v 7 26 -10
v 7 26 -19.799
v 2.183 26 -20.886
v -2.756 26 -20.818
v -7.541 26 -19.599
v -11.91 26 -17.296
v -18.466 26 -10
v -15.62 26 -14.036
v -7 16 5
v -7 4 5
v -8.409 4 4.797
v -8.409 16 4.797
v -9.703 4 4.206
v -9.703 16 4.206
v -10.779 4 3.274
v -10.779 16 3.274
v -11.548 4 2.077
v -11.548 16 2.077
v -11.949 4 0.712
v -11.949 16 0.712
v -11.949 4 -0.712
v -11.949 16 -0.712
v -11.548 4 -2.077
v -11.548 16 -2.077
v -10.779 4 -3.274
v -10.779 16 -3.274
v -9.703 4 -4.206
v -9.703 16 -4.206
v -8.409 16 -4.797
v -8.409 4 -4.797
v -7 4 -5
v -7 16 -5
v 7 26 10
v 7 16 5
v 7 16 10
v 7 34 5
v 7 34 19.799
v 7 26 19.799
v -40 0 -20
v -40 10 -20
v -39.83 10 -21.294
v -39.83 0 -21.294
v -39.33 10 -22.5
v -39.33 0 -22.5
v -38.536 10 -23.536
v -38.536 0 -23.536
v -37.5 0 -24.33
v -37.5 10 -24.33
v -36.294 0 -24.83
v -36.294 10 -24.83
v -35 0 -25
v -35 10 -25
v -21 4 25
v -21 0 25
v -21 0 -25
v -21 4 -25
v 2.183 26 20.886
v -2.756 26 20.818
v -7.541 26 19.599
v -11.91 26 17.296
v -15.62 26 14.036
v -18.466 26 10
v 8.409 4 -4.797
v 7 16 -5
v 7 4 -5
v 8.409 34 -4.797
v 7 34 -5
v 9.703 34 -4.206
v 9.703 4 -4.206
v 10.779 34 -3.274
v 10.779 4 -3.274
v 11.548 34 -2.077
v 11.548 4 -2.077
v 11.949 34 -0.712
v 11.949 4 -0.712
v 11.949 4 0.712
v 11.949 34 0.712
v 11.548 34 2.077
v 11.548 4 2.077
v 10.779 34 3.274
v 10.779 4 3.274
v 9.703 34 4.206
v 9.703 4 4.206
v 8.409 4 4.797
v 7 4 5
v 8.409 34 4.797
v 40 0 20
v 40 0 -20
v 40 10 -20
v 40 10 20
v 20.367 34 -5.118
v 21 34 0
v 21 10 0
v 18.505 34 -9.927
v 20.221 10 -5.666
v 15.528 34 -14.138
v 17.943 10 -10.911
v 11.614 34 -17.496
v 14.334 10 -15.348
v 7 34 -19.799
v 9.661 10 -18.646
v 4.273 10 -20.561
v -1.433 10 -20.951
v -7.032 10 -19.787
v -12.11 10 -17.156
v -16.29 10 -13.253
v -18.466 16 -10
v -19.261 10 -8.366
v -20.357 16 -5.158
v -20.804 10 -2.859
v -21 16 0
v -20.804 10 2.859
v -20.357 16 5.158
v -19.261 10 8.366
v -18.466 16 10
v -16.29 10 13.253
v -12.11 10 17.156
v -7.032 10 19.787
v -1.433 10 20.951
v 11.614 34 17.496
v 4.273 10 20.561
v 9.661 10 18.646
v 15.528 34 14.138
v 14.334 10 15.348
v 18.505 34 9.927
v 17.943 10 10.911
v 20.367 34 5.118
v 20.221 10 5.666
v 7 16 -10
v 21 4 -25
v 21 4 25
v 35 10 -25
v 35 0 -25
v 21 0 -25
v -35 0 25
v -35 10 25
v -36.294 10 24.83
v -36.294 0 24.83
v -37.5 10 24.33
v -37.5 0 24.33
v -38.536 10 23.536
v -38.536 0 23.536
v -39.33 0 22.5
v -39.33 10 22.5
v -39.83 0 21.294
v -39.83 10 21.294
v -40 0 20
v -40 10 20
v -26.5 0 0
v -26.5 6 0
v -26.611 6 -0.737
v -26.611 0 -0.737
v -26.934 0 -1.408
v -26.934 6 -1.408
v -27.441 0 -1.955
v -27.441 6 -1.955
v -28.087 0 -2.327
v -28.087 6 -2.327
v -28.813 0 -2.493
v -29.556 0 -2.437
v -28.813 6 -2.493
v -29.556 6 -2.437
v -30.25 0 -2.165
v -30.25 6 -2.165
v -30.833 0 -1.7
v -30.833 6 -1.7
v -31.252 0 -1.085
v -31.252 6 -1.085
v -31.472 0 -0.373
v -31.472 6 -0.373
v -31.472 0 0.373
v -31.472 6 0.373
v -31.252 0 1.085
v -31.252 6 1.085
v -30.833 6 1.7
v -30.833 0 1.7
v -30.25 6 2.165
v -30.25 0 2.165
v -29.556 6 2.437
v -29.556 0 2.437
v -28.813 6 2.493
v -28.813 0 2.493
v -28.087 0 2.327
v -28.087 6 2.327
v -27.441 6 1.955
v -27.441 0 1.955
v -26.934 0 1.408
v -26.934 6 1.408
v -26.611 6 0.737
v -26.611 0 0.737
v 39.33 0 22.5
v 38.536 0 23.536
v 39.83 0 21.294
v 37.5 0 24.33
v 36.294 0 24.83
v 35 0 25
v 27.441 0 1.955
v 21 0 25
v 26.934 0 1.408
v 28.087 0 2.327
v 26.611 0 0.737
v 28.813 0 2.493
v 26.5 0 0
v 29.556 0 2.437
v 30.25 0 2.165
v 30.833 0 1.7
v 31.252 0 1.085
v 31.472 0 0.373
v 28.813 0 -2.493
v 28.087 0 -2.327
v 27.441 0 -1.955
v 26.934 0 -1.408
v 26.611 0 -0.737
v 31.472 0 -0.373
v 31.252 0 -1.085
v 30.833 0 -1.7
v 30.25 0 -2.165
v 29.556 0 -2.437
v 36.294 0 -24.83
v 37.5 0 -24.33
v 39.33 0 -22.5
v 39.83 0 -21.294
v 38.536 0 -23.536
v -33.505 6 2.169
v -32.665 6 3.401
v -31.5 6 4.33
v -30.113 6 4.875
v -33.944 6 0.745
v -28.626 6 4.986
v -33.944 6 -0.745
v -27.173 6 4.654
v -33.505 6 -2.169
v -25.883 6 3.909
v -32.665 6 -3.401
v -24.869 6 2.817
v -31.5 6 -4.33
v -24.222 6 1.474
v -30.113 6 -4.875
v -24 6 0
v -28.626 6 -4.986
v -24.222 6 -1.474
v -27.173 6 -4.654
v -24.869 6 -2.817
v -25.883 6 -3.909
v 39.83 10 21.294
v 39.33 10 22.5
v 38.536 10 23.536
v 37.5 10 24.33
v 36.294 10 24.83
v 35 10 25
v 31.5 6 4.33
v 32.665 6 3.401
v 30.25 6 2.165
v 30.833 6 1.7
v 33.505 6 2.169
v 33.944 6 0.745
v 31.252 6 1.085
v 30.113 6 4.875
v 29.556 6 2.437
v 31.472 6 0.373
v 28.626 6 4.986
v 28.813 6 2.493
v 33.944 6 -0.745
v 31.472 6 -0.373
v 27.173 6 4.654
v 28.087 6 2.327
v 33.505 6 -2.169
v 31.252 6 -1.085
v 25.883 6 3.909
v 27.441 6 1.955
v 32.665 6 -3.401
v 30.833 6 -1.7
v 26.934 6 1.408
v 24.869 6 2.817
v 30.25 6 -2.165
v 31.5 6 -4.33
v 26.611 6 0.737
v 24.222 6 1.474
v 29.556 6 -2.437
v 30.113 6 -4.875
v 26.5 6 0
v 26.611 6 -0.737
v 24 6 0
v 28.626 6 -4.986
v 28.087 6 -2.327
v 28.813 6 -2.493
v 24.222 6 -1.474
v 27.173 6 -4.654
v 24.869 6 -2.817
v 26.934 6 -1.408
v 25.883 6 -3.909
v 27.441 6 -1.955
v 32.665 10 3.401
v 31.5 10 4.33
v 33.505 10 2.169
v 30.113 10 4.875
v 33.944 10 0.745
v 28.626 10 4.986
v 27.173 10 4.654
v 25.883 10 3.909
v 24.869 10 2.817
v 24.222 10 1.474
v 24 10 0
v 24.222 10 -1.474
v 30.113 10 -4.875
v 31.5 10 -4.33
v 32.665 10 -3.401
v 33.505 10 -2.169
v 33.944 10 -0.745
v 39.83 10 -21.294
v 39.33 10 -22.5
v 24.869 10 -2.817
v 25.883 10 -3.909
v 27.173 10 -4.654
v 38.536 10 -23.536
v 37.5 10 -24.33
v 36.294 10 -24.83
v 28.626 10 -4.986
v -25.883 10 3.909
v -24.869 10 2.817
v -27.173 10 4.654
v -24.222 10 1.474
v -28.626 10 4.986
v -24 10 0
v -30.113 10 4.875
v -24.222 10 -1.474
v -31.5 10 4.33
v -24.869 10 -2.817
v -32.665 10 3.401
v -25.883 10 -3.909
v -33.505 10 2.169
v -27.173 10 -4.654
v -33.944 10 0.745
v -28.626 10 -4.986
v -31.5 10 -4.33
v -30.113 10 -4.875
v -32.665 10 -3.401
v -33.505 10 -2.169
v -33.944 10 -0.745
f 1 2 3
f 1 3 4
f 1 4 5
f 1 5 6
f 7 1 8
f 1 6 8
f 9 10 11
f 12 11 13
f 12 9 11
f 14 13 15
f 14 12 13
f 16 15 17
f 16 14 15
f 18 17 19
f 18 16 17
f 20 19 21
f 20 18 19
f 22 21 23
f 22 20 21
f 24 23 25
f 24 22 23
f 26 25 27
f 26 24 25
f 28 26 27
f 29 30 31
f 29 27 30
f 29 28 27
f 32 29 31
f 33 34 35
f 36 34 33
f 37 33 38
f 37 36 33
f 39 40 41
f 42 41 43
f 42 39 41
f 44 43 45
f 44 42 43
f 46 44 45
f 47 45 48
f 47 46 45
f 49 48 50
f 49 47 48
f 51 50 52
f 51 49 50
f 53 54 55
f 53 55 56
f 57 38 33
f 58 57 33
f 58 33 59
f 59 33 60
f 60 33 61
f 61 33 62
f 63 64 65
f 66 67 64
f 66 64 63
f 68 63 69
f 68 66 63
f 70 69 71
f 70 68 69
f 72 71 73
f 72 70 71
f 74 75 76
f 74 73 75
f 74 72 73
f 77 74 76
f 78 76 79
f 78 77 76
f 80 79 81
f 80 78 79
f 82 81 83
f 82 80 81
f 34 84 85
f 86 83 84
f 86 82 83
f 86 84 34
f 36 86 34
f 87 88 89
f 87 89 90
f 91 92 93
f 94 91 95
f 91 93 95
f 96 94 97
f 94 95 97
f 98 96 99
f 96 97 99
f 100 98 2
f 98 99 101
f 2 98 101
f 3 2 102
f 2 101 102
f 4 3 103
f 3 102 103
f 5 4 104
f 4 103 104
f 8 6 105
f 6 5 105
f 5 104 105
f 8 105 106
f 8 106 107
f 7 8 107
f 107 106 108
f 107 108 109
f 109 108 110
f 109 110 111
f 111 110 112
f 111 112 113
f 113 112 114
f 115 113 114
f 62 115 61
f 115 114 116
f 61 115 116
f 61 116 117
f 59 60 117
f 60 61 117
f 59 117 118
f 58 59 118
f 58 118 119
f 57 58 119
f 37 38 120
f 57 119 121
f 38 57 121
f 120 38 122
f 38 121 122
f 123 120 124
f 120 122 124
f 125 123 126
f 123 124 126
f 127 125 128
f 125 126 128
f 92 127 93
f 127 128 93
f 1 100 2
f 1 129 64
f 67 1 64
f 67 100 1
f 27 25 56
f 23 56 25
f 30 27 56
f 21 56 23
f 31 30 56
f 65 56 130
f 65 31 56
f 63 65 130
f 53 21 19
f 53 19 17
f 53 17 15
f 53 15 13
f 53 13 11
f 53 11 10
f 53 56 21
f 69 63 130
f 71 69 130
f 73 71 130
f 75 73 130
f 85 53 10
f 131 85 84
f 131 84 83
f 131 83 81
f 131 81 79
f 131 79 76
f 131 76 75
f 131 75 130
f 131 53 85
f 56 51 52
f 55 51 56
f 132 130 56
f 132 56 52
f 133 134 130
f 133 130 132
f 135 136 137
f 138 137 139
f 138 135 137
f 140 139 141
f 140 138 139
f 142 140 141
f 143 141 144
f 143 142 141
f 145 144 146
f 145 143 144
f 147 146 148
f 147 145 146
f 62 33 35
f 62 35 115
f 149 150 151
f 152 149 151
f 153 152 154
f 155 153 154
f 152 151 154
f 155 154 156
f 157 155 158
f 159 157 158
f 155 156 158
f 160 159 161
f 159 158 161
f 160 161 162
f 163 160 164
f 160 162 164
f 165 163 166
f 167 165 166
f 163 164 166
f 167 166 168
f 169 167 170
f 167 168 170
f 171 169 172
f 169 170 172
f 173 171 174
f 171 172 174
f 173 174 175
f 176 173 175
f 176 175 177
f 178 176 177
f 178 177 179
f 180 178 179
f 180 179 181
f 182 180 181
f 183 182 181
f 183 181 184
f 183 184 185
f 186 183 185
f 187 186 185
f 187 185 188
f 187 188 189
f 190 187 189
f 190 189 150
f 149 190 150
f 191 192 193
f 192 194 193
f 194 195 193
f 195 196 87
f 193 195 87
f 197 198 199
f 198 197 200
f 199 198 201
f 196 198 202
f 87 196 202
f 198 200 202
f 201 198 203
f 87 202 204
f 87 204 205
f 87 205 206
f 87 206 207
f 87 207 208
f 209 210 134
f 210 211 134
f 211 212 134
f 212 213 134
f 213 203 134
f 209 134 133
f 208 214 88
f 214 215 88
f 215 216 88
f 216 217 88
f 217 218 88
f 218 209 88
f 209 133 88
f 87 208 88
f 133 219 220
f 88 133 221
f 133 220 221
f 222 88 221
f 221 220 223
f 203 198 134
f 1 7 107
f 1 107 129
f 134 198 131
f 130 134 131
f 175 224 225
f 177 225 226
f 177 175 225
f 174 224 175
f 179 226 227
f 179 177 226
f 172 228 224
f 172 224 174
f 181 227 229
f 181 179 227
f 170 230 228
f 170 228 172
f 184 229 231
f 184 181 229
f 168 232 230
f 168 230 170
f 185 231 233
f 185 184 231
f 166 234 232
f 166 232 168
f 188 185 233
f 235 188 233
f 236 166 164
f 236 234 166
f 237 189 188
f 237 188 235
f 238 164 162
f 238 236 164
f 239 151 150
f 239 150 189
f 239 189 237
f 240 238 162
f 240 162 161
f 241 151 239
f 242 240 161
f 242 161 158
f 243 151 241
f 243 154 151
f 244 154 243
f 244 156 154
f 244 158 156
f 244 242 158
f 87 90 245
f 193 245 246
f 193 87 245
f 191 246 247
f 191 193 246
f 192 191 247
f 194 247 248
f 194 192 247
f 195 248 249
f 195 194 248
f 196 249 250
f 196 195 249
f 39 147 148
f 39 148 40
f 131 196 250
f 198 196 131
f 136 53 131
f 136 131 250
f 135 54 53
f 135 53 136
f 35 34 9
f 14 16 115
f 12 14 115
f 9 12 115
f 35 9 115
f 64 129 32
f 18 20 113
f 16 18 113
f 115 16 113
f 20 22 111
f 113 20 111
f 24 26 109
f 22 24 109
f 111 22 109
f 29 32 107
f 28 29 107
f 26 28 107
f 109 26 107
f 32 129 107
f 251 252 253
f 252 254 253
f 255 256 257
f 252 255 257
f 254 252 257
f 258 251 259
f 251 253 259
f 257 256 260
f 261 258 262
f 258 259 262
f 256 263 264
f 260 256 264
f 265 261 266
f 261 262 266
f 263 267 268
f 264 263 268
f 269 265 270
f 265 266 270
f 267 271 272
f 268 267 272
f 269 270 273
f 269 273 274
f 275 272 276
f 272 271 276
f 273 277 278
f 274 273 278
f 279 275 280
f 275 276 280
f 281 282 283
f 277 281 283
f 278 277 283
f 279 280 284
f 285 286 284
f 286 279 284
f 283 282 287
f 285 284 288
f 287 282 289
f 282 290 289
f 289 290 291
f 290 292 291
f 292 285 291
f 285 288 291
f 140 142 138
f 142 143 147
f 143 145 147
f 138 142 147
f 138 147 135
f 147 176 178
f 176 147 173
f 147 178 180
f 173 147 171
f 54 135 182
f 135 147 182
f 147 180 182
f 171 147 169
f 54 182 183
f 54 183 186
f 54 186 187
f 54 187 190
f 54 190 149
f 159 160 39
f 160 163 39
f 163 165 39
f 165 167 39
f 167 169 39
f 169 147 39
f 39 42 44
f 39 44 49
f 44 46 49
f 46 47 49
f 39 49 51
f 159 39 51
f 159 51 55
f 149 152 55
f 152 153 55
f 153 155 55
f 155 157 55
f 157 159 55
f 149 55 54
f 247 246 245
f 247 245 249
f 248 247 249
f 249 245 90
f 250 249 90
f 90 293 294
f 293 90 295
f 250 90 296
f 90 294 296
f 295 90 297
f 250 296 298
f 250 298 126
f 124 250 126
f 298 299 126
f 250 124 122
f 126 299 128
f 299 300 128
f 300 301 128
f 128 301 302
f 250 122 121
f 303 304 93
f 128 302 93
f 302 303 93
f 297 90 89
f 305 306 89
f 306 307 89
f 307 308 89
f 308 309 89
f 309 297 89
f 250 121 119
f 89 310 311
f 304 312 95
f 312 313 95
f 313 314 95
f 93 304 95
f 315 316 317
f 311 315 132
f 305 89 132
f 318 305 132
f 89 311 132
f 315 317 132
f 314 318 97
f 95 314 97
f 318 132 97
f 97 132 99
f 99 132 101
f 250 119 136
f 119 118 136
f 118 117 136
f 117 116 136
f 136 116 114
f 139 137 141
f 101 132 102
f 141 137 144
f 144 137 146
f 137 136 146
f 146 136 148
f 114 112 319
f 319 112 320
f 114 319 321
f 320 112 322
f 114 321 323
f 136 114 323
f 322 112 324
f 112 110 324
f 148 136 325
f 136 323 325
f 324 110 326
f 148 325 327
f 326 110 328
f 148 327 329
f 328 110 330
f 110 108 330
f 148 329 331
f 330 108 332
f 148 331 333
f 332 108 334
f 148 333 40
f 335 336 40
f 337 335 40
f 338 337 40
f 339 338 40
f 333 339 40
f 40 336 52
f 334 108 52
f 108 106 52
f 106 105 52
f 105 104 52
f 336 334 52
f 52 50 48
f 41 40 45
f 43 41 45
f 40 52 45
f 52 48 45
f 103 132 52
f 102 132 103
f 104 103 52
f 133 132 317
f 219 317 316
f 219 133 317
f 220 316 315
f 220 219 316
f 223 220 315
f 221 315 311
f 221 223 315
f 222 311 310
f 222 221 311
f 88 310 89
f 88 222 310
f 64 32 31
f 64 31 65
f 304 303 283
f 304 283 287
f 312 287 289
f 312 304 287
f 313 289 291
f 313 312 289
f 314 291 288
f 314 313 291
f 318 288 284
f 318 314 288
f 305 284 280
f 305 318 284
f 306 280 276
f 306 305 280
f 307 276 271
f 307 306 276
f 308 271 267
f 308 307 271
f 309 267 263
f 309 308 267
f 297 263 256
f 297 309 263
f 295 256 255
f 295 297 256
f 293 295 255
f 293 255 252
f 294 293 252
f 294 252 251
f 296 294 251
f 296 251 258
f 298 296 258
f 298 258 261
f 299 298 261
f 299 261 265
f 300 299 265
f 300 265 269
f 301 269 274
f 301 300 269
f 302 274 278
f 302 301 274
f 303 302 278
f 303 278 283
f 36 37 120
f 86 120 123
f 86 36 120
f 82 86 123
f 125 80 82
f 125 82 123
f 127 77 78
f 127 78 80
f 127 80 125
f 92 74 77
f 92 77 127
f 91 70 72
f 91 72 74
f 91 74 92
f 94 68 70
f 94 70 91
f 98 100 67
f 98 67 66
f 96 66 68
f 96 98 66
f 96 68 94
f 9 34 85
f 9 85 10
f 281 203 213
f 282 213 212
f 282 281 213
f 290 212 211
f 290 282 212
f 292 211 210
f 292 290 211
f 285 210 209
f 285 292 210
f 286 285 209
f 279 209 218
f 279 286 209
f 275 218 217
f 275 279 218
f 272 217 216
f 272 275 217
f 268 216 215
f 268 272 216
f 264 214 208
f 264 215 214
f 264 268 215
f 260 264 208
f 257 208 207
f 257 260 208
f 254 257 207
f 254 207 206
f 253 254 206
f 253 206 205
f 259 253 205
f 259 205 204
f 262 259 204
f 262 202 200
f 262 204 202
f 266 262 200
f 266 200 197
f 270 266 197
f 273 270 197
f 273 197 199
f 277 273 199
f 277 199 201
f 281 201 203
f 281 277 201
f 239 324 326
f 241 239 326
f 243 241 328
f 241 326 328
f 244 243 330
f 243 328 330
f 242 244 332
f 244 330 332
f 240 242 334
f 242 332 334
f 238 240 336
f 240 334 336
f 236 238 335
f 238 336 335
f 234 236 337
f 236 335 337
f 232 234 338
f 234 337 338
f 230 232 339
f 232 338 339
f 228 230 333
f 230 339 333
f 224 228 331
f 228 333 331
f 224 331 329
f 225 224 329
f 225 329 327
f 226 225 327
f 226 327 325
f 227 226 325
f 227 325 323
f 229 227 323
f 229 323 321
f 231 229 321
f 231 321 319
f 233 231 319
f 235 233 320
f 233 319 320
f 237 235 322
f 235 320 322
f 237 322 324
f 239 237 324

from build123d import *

# Parameters (mm, degrees)
EXTRUDE_1_DEPTH          = 10
SKETCH_2_R               = 21
EXTRUDE_2_DEPTH          = 34
CUT_EXTRUDE_1_DEPTH      = 35
CUT_EXTRUDE_2_DEPTH      = 8
CUT_EXTRUDE_3_DEPTH      = 10
SKETCH_6_R               = 5
CUT_EXTRUDE_4_DEPTH      = 4
SKETCH_7_R               = 2.5
CUT_EXTRUDE_5_DEPTH      = 7
SKETCH_8_W               = 42
SKETCH_8_H               = 4
CUT_EXTRUDE_6_DEPTH      = 26
CUT_EXTRUDE_6_DEPTH_BACK = 26


with BuildPart() as part:
    # 草图1 → 凸台-拉伸1 (new body)
    with BuildSketch(Plane(origin=(0, 0, 0), x_dir=(1, 0, 0), z_dir=(0, 1, 0))):
        with BuildLine():
            Line((-35, 25), (35, 25))
            ThreePointArc((35, 25), (38.535533906, 23.535533906), (40, 20))
            Line((40, 20), (40, -20))
            ThreePointArc((40, -20), (38.535533906, -23.535533906), (35, -25))
            Line((35, -25), (-35, -25))
            ThreePointArc((-35, -25), (-38.535533906, -23.535533906), (-40, -20))
            Line((-40, -20), (-40, 20))
            ThreePointArc((-40, 20), (-38.535533906, 23.535533906), (-35, 25))
        make_face()
    extrude(amount=EXTRUDE_1_DEPTH)

    # 草图2 → 凸台-拉伸2 (add)
    with BuildSketch(Plane(origin=(0, 0, 0), x_dir=(1, 0, 0), z_dir=(0, 1, 0))):
        Circle(SKETCH_2_R)
    extrude(amount=EXTRUDE_2_DEPTH)

    # 草图3 → 切除-拉伸1 (cut, through all)
    with BuildSketch(Plane(origin=(0, 34, 0), x_dir=(1, 0, 0), z_dir=(0, 1, 0))):
        with BuildLine():
            Line((-7, 5), (7, 5))
            ThreePointArc((7, 5), (12, 0), (7, -5))
            Line((7, -5), (-7, -5))
            ThreePointArc((-7, -5), (-12, 0), (-7, 5))
        make_face()
    extrude(amount=-CUT_EXTRUDE_1_DEPTH, mode=Mode.SUBTRACT)

    # 草图4 → 切除-拉伸2 (cut)
    with BuildSketch(Plane(origin=(0, 34, 0), x_dir=(1, 0, 0), z_dir=(0, 1, 0))):
        with BuildLine():
            Line((7, 19.798989873), (7, -19.798989873))
            ThreePointArc((7, -19.798989873), (-21, 0), (7, 19.798989873))
        make_face()
    extrude(amount=-CUT_EXTRUDE_2_DEPTH, mode=Mode.SUBTRACT)

    # 草图5 → 切除-拉伸3 (cut)
    with BuildSketch(Plane(origin=(0, 26, 0), x_dir=(1, 0, 0), z_dir=(0, 1, 0))):
        with BuildLine():
            Line((-18.466185313, 10), (7, 10))
            Line((7, 10), (7, -10))
            Line((7, -10), (-18.466185313, -10))
            ThreePointArc((-18.466185313, -10), (-21, 0), (-18.466185313, 10))
        make_face()
    extrude(amount=-CUT_EXTRUDE_3_DEPTH, mode=Mode.SUBTRACT)

    # 草图6 → 切除-拉伸4 (cut)
    with BuildSketch(Plane(origin=(0, 10, 0), x_dir=(1, 0, 0), z_dir=(0, 1, 0))):
        with Locations((-29, 0)):
            Circle(SKETCH_6_R)
    cut_extrude_4 = extrude(amount=-CUT_EXTRUDE_4_DEPTH, mode=Mode.SUBTRACT)

    # 草图7 → 切除-拉伸5 (cut, through all)
    with BuildSketch(Plane(origin=(0, 6, 0), x_dir=(1, 0, 0), z_dir=(0, 1, 0))):
        with Locations((-29, 0)):
            Circle(SKETCH_7_R)
    cut_extrude_5 = extrude(amount=-CUT_EXTRUDE_5_DEPTH, mode=Mode.SUBTRACT)

    # 镜向1: 切除-拉伸4, 切除-拉伸5 across plane
    add(cut_extrude_4.mirror(Plane(origin=(0, 0, 0), x_dir=(0, 0, 1), z_dir=(1, 0, 0))), mode=Mode.SUBTRACT)
    add(cut_extrude_5.mirror(Plane(origin=(0, 0, 0), x_dir=(0, 0, 1), z_dir=(1, 0, 0))), mode=Mode.SUBTRACT)

    # 草图8 → 切除-拉伸6 (cut, two sides)
    with BuildSketch(Plane.XY) as cut_extrude_6_sk:
        with Locations((0, 2)):
            Rectangle(SKETCH_8_W, SKETCH_8_H)
    extrude(amount=CUT_EXTRUDE_6_DEPTH, mode=Mode.SUBTRACT)
    extrude(cut_extrude_6_sk.sketch, amount=-CUT_EXTRUDE_6_DEPTH_BACK, mode=Mode.SUBTRACT)


solid = part.part
